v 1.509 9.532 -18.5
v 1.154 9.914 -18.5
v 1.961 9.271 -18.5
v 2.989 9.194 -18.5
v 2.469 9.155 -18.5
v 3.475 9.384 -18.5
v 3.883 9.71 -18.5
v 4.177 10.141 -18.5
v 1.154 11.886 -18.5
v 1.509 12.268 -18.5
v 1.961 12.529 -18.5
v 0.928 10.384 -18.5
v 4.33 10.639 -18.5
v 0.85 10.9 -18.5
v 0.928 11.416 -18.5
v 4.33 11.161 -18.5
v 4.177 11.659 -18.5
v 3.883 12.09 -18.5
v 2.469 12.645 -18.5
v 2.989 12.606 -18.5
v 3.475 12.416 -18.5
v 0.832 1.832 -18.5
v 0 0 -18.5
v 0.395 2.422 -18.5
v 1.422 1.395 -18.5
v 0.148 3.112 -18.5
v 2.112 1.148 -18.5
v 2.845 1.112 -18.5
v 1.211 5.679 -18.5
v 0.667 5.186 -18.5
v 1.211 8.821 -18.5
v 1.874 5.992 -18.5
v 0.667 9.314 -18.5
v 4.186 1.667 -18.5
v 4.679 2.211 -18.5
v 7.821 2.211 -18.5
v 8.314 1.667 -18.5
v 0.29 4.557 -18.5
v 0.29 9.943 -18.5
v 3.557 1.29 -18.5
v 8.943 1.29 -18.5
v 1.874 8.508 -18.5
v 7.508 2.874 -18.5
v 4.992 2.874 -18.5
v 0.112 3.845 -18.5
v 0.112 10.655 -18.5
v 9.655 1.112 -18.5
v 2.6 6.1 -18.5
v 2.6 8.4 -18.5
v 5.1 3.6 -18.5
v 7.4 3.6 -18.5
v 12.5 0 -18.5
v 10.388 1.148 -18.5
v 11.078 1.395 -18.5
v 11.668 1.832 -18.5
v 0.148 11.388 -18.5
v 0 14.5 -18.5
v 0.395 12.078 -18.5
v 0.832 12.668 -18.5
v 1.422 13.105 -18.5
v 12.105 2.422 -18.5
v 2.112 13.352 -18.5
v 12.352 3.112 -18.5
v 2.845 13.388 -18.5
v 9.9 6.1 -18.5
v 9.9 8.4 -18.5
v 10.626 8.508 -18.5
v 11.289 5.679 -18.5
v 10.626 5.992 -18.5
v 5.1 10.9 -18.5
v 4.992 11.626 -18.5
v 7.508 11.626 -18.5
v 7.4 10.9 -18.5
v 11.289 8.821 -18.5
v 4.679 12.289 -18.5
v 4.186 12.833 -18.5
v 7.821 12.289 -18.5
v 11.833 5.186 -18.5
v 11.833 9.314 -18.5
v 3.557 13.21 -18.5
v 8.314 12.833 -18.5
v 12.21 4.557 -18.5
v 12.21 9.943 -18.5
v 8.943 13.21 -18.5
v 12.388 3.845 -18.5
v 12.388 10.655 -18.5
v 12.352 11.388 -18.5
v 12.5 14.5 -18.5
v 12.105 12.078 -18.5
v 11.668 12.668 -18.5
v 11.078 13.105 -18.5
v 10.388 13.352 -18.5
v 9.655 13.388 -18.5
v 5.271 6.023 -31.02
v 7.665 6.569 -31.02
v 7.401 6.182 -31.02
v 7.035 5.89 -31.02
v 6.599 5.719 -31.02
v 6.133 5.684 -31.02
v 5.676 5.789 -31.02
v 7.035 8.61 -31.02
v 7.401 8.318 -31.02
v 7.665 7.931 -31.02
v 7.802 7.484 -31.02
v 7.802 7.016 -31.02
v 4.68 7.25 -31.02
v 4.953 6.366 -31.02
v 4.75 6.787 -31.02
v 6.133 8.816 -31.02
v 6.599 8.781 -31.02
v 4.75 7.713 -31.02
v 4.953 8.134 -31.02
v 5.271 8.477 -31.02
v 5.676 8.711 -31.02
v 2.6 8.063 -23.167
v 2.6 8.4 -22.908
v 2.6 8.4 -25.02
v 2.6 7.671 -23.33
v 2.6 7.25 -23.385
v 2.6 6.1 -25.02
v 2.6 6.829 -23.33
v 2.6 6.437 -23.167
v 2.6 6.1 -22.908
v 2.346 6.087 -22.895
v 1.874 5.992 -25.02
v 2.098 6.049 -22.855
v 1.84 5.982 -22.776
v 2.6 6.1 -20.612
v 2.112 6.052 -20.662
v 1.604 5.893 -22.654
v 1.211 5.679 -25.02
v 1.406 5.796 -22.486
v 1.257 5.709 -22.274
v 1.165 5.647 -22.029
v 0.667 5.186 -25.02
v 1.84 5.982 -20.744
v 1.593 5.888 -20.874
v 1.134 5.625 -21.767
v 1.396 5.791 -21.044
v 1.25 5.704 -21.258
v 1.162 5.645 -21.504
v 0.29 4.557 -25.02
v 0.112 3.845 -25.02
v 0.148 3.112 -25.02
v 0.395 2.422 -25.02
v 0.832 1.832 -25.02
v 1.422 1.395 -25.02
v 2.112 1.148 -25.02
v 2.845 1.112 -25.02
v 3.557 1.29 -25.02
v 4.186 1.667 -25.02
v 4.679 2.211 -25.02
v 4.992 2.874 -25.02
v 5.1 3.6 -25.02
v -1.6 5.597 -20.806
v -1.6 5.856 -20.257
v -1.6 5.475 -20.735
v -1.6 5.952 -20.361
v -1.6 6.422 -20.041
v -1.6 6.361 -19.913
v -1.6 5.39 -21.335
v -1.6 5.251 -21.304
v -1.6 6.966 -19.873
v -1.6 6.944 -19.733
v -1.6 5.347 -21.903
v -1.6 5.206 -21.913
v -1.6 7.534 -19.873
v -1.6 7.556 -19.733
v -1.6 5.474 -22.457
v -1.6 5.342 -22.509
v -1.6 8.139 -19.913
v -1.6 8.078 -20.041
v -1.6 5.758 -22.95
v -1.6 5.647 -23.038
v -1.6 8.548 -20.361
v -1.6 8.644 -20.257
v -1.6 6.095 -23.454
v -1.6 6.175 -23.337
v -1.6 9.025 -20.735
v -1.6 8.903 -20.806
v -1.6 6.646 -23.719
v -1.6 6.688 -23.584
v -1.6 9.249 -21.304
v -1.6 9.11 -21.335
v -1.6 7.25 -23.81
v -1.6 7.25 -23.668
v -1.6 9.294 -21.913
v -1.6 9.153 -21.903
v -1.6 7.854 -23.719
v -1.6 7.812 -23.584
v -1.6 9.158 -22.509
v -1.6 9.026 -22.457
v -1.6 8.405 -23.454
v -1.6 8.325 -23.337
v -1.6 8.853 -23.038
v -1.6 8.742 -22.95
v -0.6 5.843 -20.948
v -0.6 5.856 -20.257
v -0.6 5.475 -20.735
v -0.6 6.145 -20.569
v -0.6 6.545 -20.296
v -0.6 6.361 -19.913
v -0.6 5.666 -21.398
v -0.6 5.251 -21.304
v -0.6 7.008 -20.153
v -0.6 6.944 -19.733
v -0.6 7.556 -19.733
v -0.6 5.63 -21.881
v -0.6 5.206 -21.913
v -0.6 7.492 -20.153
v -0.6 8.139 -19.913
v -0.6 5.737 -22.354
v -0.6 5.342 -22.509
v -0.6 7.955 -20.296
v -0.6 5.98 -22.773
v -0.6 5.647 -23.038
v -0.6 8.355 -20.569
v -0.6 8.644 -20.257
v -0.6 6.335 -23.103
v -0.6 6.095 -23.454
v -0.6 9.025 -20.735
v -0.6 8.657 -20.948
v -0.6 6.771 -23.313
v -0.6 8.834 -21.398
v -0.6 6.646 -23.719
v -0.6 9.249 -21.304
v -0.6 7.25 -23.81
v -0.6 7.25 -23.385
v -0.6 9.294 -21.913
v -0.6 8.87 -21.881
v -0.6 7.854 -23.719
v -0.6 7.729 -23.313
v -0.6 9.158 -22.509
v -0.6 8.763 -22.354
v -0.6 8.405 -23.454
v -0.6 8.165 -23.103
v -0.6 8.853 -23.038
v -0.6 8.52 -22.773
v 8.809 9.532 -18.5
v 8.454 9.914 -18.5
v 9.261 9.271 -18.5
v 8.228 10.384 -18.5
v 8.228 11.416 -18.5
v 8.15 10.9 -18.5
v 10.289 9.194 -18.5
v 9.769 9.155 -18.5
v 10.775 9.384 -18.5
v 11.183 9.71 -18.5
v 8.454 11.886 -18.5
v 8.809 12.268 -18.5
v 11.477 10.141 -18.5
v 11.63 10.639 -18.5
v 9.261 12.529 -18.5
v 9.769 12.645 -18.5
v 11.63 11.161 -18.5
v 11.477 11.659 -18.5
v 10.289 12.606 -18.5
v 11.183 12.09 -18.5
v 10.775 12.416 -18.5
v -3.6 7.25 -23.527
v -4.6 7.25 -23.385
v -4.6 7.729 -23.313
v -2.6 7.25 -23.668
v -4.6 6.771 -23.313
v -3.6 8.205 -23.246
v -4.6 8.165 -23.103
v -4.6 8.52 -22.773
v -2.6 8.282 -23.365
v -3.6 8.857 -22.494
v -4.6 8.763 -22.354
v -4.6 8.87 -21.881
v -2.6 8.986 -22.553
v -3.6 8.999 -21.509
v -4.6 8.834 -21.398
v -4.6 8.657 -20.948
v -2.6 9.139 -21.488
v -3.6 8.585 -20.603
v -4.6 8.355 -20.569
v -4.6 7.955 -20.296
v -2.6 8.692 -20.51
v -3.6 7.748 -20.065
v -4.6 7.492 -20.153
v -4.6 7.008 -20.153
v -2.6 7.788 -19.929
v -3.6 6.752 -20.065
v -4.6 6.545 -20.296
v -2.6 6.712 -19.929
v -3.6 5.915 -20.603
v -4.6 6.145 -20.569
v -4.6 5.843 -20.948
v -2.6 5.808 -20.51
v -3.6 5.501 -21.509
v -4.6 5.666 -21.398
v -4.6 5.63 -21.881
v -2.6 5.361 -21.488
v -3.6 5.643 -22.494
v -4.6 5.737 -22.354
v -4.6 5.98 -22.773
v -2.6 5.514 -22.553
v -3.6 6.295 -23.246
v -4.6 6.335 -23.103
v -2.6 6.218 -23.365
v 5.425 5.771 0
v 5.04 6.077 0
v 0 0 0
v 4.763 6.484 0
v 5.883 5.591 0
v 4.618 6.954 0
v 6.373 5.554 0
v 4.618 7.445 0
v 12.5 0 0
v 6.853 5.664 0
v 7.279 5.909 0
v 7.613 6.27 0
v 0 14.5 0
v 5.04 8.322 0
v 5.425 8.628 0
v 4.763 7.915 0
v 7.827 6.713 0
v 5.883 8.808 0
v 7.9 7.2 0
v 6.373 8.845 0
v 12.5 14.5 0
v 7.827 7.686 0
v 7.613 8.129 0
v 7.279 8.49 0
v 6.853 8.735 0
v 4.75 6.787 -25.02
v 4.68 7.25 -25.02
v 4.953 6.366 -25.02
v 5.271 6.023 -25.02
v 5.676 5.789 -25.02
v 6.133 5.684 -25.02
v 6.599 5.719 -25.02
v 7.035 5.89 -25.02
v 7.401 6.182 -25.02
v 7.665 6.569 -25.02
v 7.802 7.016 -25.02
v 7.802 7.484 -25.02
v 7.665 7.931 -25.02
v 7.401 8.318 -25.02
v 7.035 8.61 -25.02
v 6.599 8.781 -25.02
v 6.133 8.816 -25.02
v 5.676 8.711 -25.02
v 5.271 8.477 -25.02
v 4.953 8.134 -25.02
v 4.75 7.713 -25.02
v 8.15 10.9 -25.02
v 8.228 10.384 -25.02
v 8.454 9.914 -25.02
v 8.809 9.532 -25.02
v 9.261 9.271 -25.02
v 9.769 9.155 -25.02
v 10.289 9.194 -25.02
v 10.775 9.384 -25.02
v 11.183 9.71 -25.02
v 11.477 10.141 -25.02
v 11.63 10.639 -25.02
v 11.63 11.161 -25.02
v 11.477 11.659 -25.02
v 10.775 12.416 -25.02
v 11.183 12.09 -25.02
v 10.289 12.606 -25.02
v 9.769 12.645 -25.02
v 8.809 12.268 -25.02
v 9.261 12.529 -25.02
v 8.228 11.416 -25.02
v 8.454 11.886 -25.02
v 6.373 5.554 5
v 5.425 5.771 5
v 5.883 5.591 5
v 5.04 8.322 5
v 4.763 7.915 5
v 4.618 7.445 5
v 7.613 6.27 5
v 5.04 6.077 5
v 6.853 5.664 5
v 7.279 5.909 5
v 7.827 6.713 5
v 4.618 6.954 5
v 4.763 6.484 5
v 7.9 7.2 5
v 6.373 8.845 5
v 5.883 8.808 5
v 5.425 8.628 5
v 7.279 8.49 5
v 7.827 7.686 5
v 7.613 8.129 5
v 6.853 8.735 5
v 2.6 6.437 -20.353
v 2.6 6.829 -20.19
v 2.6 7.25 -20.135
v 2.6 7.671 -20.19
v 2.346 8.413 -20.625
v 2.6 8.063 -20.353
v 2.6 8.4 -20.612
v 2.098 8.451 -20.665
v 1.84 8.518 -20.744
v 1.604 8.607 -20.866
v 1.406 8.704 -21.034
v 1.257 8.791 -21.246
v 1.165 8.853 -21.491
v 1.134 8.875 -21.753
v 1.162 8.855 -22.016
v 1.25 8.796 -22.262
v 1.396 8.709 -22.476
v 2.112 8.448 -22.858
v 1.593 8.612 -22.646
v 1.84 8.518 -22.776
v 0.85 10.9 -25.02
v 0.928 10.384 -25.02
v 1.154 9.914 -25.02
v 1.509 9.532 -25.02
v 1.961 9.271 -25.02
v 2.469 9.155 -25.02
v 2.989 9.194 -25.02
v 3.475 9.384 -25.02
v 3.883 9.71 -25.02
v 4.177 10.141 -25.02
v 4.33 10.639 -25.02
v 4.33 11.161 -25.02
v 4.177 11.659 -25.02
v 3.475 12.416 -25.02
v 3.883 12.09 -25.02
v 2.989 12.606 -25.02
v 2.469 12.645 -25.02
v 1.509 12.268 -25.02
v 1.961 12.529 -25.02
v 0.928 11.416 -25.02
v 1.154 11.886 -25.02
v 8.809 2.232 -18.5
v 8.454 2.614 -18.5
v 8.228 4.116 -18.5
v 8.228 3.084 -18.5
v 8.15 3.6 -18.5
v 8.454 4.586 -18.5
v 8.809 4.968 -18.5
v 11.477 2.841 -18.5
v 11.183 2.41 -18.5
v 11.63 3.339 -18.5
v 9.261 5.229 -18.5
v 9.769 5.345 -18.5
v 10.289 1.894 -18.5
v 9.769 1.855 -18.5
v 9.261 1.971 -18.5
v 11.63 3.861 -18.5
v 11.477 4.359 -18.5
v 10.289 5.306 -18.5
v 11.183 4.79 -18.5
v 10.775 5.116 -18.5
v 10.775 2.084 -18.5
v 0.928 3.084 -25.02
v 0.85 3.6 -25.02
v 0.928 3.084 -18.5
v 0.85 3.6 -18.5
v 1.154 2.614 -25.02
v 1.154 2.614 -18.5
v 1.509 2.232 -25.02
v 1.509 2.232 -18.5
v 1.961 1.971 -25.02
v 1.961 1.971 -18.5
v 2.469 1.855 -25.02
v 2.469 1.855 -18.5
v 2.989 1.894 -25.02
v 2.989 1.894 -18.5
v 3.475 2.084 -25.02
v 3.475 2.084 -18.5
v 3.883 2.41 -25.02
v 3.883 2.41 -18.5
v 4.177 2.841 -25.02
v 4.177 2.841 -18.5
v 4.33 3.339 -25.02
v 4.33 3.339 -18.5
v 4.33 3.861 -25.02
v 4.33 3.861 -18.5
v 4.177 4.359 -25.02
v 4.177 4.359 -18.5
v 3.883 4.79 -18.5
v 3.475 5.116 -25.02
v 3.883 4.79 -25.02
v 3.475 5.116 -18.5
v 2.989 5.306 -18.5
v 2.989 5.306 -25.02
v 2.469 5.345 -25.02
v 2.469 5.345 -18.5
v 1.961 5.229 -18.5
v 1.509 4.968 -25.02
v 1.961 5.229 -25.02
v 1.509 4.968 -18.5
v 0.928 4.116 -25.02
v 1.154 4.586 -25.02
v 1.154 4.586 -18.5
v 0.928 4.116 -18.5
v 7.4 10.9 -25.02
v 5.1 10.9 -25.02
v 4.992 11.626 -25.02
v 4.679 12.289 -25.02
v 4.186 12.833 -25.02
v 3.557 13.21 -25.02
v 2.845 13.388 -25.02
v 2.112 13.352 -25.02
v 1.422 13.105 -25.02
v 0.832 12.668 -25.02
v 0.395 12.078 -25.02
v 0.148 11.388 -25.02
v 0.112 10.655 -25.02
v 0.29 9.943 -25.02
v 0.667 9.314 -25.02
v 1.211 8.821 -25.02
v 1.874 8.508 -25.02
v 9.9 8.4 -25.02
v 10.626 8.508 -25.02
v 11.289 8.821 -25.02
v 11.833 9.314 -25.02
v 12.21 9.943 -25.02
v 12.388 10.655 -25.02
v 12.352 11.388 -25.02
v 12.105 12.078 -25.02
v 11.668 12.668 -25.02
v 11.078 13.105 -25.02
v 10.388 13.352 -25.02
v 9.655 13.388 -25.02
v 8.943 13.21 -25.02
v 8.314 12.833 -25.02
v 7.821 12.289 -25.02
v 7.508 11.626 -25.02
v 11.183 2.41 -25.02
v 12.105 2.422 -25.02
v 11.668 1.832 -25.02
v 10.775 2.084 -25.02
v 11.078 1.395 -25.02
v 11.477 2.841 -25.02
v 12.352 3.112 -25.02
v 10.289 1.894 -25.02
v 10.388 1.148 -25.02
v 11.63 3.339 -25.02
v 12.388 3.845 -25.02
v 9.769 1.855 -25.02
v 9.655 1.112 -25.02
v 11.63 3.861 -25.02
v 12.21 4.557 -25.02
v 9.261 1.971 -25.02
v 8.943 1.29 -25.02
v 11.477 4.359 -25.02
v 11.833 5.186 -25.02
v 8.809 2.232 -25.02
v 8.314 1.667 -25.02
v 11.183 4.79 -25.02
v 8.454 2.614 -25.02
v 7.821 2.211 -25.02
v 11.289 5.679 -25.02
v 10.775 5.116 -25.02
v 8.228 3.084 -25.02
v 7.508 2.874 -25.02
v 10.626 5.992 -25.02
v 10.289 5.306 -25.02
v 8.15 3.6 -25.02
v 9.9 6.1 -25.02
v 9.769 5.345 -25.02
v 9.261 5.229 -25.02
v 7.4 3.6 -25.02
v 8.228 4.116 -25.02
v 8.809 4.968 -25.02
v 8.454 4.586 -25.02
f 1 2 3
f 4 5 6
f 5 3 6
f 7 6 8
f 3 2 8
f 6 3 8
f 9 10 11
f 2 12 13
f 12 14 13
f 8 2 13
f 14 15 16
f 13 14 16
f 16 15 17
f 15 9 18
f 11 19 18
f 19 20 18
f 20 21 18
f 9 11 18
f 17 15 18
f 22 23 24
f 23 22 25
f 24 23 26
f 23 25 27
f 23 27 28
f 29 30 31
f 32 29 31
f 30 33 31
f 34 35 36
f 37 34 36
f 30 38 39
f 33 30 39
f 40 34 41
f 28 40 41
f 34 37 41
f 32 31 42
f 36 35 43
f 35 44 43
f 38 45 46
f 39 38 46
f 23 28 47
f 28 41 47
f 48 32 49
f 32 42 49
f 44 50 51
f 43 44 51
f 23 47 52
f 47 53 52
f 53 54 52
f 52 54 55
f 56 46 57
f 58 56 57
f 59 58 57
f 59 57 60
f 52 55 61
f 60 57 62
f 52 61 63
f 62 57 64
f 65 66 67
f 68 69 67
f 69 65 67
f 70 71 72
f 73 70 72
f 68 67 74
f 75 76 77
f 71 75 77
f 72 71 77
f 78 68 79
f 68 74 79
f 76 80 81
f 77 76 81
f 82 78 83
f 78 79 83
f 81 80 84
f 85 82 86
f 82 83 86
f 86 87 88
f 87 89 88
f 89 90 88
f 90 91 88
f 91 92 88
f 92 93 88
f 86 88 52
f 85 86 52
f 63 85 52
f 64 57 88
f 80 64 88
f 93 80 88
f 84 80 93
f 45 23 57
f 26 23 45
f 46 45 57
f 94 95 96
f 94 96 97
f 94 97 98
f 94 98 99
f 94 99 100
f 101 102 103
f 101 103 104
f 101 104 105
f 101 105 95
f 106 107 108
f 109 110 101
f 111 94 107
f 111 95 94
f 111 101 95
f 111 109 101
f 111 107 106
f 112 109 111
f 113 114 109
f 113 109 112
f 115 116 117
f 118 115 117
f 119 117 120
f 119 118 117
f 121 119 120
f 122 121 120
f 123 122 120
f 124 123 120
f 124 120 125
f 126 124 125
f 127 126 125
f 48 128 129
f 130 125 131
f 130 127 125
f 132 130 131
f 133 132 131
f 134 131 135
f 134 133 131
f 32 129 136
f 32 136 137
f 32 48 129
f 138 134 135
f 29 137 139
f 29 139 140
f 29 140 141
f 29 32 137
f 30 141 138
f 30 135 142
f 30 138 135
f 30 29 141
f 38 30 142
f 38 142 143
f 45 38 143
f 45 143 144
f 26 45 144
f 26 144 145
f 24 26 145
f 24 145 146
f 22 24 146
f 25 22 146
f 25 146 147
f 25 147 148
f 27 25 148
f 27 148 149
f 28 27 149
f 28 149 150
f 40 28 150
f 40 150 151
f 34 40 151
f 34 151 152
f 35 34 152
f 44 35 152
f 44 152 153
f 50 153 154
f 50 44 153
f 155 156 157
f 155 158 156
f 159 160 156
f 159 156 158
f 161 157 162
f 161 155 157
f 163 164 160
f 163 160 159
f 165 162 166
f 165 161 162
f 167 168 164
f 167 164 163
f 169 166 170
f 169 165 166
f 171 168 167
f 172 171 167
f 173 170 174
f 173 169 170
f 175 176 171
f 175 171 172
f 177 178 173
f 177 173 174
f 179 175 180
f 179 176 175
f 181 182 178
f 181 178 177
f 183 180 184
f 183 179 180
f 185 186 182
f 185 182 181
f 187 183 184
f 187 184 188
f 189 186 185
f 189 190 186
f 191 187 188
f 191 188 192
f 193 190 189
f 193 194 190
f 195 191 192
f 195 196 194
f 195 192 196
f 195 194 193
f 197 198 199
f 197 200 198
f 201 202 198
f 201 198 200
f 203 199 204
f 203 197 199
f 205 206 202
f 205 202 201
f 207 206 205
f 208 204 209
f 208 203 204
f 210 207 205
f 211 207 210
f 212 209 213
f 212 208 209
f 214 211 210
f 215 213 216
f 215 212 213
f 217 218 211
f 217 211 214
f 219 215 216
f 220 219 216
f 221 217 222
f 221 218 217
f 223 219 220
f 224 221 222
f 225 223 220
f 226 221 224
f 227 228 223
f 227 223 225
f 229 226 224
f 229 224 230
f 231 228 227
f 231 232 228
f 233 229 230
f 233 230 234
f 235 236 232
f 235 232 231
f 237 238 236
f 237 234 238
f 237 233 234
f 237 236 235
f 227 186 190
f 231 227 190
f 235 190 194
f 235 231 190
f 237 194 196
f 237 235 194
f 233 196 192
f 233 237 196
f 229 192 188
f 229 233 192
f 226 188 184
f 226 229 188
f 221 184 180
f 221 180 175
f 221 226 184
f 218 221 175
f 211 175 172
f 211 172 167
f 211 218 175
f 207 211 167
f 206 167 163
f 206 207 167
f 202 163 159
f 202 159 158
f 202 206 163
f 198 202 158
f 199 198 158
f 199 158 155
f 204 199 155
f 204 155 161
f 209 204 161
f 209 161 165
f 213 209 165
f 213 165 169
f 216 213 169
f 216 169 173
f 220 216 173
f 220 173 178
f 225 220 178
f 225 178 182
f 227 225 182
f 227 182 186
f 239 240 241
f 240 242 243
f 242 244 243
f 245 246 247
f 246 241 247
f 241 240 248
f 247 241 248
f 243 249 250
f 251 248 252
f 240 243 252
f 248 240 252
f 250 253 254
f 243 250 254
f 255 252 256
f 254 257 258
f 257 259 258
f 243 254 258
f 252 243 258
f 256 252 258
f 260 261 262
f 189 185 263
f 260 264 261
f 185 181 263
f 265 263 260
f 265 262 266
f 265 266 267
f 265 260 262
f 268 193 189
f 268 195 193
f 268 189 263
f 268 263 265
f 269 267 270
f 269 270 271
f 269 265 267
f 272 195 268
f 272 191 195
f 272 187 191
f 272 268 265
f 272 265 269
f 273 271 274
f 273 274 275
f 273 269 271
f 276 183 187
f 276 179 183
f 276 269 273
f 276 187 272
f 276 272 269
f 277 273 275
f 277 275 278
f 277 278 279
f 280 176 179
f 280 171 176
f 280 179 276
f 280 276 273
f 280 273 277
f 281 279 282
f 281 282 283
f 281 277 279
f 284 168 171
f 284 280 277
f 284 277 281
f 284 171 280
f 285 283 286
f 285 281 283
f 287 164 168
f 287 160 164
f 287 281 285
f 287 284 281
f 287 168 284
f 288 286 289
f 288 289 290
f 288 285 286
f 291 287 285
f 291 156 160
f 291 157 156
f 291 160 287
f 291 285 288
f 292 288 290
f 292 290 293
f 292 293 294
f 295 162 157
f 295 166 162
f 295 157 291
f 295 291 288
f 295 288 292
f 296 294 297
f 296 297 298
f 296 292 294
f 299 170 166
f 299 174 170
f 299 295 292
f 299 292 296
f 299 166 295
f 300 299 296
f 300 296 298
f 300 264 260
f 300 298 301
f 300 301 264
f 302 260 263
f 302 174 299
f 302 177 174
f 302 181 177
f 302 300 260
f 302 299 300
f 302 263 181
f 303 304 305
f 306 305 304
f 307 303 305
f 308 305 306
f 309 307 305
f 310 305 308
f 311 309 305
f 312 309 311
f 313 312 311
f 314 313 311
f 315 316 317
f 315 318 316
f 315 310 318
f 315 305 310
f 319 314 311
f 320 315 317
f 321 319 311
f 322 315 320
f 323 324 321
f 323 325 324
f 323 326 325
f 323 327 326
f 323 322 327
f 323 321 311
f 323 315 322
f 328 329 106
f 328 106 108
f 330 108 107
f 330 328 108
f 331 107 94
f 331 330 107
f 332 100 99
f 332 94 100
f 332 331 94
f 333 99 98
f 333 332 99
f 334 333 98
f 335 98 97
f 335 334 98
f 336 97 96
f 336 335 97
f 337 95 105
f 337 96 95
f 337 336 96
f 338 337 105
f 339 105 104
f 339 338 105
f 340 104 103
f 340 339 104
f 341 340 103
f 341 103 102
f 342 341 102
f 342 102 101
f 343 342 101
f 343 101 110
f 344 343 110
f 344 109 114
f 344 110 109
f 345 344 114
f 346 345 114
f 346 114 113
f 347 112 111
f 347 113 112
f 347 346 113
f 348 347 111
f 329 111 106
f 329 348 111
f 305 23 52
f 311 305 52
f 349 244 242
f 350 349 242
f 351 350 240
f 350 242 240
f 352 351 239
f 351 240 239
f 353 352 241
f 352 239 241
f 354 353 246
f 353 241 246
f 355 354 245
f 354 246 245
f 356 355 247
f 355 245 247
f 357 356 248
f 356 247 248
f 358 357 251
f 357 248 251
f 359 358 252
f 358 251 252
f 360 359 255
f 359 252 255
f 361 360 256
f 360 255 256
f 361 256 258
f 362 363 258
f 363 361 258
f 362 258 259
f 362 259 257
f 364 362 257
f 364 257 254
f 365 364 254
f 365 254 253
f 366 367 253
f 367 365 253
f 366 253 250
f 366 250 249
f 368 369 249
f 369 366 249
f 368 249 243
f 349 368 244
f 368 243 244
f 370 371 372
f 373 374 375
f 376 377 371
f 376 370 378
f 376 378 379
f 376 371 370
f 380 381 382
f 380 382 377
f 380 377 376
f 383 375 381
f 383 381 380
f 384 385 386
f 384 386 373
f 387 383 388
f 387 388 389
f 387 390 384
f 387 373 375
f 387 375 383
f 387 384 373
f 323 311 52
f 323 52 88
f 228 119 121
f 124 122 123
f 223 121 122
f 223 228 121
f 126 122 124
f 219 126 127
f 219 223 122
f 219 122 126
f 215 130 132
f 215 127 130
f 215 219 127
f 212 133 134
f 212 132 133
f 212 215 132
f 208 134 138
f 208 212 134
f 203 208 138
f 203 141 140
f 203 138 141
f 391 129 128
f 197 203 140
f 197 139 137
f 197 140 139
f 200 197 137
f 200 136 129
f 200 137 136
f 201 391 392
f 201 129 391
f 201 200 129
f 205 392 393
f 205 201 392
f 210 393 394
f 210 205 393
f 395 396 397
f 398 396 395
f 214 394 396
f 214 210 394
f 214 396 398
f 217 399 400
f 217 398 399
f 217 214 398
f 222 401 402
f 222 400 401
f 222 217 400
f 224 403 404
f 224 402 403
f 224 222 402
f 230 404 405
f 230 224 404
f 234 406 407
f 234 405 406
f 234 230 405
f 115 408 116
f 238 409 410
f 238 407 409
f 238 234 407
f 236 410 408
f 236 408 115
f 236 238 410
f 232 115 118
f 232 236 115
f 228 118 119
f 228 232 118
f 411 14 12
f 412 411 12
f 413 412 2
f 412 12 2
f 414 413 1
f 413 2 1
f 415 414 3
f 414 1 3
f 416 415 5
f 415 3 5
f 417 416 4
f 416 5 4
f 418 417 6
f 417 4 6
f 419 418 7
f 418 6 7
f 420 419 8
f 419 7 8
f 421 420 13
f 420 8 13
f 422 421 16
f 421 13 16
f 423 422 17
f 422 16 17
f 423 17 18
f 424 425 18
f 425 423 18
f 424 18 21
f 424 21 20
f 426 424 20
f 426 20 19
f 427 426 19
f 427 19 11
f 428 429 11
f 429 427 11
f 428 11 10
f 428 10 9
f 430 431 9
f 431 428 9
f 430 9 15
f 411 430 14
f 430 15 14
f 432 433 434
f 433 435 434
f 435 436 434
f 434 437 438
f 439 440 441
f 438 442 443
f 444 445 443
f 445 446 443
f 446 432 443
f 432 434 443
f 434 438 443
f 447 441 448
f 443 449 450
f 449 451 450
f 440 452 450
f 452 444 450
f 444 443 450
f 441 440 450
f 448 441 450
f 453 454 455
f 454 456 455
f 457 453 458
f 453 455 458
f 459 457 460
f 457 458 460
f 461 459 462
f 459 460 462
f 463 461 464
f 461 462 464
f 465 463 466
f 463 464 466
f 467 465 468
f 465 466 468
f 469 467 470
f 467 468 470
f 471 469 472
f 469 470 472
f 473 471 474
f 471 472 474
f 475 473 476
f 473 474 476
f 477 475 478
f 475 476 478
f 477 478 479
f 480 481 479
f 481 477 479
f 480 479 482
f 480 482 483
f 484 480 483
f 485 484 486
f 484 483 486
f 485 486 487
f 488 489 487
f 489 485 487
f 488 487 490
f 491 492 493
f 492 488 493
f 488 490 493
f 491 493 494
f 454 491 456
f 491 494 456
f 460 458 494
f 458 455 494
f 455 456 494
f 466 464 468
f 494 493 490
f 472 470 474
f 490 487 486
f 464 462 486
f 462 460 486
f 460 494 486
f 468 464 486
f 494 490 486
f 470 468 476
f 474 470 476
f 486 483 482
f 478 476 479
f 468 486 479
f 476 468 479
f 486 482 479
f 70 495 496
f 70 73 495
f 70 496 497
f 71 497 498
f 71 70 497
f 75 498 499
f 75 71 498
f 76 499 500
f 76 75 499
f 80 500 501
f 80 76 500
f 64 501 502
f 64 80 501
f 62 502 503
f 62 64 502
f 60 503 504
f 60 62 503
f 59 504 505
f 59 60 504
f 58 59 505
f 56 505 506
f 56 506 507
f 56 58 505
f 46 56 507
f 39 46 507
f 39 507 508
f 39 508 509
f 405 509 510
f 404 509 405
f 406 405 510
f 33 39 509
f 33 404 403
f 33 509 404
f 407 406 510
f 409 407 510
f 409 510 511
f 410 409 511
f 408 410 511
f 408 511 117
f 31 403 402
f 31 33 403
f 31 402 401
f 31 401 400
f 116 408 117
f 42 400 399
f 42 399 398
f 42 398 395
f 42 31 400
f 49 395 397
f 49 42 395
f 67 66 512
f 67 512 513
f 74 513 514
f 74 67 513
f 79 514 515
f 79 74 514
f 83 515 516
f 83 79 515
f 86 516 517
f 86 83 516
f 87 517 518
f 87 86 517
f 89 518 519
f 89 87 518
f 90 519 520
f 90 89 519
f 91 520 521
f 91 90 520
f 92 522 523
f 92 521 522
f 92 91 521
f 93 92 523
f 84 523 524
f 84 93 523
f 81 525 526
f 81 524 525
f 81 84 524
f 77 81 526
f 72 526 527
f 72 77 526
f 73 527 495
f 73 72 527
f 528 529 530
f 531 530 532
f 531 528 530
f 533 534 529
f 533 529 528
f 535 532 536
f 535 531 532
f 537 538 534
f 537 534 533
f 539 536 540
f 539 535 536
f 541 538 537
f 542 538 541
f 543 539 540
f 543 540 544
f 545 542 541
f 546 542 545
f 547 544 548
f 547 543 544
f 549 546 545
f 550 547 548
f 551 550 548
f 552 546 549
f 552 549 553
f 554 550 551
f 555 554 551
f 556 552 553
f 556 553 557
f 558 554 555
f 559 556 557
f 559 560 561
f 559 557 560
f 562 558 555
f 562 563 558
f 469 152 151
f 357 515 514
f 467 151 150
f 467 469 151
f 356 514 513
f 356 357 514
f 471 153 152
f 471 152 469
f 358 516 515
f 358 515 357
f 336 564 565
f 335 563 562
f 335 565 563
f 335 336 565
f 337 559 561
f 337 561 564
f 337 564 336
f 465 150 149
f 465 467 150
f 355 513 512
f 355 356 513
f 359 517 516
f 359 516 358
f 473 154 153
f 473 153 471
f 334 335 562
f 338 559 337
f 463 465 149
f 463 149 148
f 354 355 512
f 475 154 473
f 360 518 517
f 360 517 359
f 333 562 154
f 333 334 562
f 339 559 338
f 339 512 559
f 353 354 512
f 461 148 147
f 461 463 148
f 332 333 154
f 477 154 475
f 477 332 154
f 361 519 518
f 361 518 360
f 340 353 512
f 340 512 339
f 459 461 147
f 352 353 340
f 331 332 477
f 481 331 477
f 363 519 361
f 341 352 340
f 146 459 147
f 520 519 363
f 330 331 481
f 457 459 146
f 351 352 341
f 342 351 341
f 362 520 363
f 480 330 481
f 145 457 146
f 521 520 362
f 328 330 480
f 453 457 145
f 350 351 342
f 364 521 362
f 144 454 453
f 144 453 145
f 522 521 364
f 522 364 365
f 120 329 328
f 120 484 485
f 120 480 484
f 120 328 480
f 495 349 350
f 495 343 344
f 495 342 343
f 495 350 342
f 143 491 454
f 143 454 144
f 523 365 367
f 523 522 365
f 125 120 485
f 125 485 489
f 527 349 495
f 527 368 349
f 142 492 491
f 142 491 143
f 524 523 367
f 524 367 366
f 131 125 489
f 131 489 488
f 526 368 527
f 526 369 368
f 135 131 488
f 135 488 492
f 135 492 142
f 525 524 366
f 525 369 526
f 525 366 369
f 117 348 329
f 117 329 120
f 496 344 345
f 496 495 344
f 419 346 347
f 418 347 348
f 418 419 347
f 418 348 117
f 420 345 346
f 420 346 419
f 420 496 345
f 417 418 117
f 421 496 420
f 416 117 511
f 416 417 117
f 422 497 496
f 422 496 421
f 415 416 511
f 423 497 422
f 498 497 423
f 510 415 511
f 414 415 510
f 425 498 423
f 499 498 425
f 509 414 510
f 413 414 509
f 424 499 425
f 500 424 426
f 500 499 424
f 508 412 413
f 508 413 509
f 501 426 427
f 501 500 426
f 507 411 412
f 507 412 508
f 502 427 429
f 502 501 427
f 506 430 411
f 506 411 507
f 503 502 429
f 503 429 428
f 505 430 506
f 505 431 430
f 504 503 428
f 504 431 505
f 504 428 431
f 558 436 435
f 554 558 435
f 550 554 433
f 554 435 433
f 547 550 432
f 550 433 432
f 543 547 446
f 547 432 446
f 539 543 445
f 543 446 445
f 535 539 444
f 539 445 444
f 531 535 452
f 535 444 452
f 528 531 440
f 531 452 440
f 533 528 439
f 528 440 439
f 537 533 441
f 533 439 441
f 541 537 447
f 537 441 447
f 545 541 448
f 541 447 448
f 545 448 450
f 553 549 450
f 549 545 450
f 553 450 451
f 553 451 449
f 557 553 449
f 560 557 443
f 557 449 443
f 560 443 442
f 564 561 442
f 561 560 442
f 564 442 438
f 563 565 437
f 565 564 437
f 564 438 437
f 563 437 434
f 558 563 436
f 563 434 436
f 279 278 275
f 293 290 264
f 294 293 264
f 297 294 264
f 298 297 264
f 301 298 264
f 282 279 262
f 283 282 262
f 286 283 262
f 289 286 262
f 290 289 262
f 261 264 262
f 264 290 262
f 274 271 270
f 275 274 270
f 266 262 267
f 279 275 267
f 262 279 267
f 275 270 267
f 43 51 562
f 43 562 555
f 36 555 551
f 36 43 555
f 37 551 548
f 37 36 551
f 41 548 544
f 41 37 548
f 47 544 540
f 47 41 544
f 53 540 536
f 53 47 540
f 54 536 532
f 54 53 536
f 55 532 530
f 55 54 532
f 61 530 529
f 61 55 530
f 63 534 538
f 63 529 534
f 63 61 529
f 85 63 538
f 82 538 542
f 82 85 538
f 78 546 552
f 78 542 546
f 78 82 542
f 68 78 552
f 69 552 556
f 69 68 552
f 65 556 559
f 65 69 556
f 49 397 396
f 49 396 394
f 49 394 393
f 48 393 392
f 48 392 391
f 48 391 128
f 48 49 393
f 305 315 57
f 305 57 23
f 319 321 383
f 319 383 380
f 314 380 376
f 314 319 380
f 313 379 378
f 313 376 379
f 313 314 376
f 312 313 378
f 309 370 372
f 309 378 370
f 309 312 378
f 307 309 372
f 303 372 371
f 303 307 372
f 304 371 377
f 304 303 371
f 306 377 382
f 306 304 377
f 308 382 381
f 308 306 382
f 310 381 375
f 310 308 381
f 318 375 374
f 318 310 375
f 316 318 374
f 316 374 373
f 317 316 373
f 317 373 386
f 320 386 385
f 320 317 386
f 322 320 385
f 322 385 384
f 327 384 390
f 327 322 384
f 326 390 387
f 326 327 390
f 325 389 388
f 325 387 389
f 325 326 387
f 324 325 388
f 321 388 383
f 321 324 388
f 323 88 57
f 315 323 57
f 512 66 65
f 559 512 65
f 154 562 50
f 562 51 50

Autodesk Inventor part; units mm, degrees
ref_plane "YZ Plane" through (0, 0, 0) normal (1, 0, 0) x (0, 1, 0)
ref_plane "XZ Plane" through (0, 0, 0) normal (0, 1, 0) x (-1, 0, 0)
sketch "Sketch1" plane through (0, 0, 0) normal (0, 0, 1) x (1, 0, 0)
  line L0 (0, 0) -> (12.5, 0)
  line L1 (12.5, 0) -> (12.5, 14.5)
  line L2 (12.5, 14.5) -> (0, 14.5)
  line L3 (0, 14.5) -> (0, 0)
  dimension "d0" = 14.5
  dimension "d1" = 12.5
extrude "Extrusion1" add sketch "Sketch1" against normal blind 18.5
sketch "Sketch2" plane through (0, 0, -18.5) normal (0, 0, -1) x (-1, 0, 0)
  circle A0 centre (-9.9, 3.6) radius 2.5
  circle A1 centre (-2.6, 3.6) radius 2.5
  circle A2 centre (-2.6, 10.9) radius 2.5
  circle A3 centre (-9.9, 10.9) radius 2.5
  line L0 (-9.9, 10.9) -> (-9.9, 3.6) construction
  line L1 (-12.5, 14.5) -> (-12.5, 0) construction
  line L2 (-9.9, 10.9) -> (-2.6, 10.9) construction
  line L3 (0, 14.5) -> (-12.5, 14.5) construction
  line L4 (-7.4, 10.9) -> (-5.1, 10.9)
  line L5 (-2.6, 8.4) -> (-2.6, 6.1)
  line L6 (-7.4, 3.6) -> (-5.1, 3.6)
  line L7 (-9.9, 8.4) -> (-9.9, 6.1)
  circle A4 centre (-9.9, 10.9) radius 1.75
  circle A5 centre (-2.6, 10.9) radius 1.75
  circle A6 centre (-2.6, 3.6) radius 1.75
  circle A7 centre (-9.9, 3.6) radius 1.75
  circle A8 centre (-6.25, 7.25) radius 1.57
  point P0 (0, 0)
  point P1 (-9.9, 7.25)
  point P2 (-12.5, 7.25)
  point P3 (-6.25, 10.9)
  point P4 (-6.25, 14.5)
  point P5 (-6.25, 3.6)
  point P6 (-2.6, 7.25)
  dimension "d4" = 5
  dimension "d5" = 12.3
  dimension "d6" = 7.3
  dimension "d7" = 0.75
  dimension "d8" = 3.14
sketch "Sketch3" plane through (0, 0, 0) normal (0, 0, 1) x (1, 0, 0)
  circle A0 centre (6.25, 7.1995) radius 1.65
  point P0 (0, 0)
  dimension "d9" = 3.3
extrude "Extrusion2" add sketch "Sketch3" along normal blind 5
extrude "Extrusion3" add sketch "Sketch2" along normal blind 6.52
extrude "Extrusion4" add sketch "Sketch2" along normal blind 12.52 contours A8
ref_plane "Work Plane1" through (6.25, 0, 0) normal (1, 0, 0) x (0, 0, -1)
sketch "Sketch4" plane through (6.25, 0, 0) normal (1, 0, 0) x (0, 0, -1)
  line L0 (18.5, 10.9) -> (25.02, 10.9) projected
  line L1 (21.76, 10.9) -> (23.385, 10.9)
  line L2 (23.385, 10.9) -> (23.385, 14.1)
  line L3 (23.385, 18.1) -> (21.76, 18.1)
  line L4 (21.76, 18.1) -> (21.76, 10.9)
  line L5 (21.76, 10.9) -> (23.385, 10.9)
  line L6 (23.385, 10.9) -> (23.385, 14.1)
  line L7 (21.76, 18.1) -> (21.76, 15.1)
  line L8 (23.6683, 15.1) -> (23.81, 15.1)
  line L9 (23.81, 15.1) -> (23.385, 18.1)
  line L10 (21.76, 18.1) -> (21.76, 14.1)
  line L11 (23.385, 14.1) -> (23.81, 14.1)
  line L12 (23.81, 14.1) -> (23.6683, 15.1)
  point P0 (0, 0)
  dimension "d16" = 1.625
  dimension "d17" = 7.2
  dimension "d18" = 90
  dimension "d19" = 3
  dimension "d20" = 2.05
  dimension "d21" = 4
  dimension "d22" = 1.625
  dimension "d23" = 2.05
  dimension "d24" = 3
revolve "Revolution1" add sketch "Sketch4" angle 360 about axis through (6.25, 18.1, -21.76) along (0, -1, 0)
pattern_circular "Circular Pattern1" count 4 over 360 about axis through (6.25, 7.25, -18.5) along (0, 0, -1) of "Revolution1"
delete faces "Delete Face1" heal yes whole lump no faces at (8.0785, 15.7667, -22.4534) (5.7435, 18.1, -22.5272) (8.079, 14.2111, -22.6505) (7.3088, 12.1519, -20.5273) (6.0865, 14.1, -23.6485) (6.0865, 15.1, -23.7429) (14.7667, 7.718, -23.6587) (14.1, 6.0575, -23.3527) (13.2111, 5.421, -22.6505) (13.1, 7.4135, -23.6485) (11.1519, 6.1912, -20.5273) (17.1, 7.7565, -22.5272) (6.718, -1.2667, -23.6587) (4.421, 0.2889, -22.6505) (5.0575, -0.6, -23.3527) (6.4135, 0.4, -23.6485) (5.1912, 2.3481, -20.5273) (6.7565, -3.6, -22.5272)
properties part number "Adafruit_1528-4663-ND"
